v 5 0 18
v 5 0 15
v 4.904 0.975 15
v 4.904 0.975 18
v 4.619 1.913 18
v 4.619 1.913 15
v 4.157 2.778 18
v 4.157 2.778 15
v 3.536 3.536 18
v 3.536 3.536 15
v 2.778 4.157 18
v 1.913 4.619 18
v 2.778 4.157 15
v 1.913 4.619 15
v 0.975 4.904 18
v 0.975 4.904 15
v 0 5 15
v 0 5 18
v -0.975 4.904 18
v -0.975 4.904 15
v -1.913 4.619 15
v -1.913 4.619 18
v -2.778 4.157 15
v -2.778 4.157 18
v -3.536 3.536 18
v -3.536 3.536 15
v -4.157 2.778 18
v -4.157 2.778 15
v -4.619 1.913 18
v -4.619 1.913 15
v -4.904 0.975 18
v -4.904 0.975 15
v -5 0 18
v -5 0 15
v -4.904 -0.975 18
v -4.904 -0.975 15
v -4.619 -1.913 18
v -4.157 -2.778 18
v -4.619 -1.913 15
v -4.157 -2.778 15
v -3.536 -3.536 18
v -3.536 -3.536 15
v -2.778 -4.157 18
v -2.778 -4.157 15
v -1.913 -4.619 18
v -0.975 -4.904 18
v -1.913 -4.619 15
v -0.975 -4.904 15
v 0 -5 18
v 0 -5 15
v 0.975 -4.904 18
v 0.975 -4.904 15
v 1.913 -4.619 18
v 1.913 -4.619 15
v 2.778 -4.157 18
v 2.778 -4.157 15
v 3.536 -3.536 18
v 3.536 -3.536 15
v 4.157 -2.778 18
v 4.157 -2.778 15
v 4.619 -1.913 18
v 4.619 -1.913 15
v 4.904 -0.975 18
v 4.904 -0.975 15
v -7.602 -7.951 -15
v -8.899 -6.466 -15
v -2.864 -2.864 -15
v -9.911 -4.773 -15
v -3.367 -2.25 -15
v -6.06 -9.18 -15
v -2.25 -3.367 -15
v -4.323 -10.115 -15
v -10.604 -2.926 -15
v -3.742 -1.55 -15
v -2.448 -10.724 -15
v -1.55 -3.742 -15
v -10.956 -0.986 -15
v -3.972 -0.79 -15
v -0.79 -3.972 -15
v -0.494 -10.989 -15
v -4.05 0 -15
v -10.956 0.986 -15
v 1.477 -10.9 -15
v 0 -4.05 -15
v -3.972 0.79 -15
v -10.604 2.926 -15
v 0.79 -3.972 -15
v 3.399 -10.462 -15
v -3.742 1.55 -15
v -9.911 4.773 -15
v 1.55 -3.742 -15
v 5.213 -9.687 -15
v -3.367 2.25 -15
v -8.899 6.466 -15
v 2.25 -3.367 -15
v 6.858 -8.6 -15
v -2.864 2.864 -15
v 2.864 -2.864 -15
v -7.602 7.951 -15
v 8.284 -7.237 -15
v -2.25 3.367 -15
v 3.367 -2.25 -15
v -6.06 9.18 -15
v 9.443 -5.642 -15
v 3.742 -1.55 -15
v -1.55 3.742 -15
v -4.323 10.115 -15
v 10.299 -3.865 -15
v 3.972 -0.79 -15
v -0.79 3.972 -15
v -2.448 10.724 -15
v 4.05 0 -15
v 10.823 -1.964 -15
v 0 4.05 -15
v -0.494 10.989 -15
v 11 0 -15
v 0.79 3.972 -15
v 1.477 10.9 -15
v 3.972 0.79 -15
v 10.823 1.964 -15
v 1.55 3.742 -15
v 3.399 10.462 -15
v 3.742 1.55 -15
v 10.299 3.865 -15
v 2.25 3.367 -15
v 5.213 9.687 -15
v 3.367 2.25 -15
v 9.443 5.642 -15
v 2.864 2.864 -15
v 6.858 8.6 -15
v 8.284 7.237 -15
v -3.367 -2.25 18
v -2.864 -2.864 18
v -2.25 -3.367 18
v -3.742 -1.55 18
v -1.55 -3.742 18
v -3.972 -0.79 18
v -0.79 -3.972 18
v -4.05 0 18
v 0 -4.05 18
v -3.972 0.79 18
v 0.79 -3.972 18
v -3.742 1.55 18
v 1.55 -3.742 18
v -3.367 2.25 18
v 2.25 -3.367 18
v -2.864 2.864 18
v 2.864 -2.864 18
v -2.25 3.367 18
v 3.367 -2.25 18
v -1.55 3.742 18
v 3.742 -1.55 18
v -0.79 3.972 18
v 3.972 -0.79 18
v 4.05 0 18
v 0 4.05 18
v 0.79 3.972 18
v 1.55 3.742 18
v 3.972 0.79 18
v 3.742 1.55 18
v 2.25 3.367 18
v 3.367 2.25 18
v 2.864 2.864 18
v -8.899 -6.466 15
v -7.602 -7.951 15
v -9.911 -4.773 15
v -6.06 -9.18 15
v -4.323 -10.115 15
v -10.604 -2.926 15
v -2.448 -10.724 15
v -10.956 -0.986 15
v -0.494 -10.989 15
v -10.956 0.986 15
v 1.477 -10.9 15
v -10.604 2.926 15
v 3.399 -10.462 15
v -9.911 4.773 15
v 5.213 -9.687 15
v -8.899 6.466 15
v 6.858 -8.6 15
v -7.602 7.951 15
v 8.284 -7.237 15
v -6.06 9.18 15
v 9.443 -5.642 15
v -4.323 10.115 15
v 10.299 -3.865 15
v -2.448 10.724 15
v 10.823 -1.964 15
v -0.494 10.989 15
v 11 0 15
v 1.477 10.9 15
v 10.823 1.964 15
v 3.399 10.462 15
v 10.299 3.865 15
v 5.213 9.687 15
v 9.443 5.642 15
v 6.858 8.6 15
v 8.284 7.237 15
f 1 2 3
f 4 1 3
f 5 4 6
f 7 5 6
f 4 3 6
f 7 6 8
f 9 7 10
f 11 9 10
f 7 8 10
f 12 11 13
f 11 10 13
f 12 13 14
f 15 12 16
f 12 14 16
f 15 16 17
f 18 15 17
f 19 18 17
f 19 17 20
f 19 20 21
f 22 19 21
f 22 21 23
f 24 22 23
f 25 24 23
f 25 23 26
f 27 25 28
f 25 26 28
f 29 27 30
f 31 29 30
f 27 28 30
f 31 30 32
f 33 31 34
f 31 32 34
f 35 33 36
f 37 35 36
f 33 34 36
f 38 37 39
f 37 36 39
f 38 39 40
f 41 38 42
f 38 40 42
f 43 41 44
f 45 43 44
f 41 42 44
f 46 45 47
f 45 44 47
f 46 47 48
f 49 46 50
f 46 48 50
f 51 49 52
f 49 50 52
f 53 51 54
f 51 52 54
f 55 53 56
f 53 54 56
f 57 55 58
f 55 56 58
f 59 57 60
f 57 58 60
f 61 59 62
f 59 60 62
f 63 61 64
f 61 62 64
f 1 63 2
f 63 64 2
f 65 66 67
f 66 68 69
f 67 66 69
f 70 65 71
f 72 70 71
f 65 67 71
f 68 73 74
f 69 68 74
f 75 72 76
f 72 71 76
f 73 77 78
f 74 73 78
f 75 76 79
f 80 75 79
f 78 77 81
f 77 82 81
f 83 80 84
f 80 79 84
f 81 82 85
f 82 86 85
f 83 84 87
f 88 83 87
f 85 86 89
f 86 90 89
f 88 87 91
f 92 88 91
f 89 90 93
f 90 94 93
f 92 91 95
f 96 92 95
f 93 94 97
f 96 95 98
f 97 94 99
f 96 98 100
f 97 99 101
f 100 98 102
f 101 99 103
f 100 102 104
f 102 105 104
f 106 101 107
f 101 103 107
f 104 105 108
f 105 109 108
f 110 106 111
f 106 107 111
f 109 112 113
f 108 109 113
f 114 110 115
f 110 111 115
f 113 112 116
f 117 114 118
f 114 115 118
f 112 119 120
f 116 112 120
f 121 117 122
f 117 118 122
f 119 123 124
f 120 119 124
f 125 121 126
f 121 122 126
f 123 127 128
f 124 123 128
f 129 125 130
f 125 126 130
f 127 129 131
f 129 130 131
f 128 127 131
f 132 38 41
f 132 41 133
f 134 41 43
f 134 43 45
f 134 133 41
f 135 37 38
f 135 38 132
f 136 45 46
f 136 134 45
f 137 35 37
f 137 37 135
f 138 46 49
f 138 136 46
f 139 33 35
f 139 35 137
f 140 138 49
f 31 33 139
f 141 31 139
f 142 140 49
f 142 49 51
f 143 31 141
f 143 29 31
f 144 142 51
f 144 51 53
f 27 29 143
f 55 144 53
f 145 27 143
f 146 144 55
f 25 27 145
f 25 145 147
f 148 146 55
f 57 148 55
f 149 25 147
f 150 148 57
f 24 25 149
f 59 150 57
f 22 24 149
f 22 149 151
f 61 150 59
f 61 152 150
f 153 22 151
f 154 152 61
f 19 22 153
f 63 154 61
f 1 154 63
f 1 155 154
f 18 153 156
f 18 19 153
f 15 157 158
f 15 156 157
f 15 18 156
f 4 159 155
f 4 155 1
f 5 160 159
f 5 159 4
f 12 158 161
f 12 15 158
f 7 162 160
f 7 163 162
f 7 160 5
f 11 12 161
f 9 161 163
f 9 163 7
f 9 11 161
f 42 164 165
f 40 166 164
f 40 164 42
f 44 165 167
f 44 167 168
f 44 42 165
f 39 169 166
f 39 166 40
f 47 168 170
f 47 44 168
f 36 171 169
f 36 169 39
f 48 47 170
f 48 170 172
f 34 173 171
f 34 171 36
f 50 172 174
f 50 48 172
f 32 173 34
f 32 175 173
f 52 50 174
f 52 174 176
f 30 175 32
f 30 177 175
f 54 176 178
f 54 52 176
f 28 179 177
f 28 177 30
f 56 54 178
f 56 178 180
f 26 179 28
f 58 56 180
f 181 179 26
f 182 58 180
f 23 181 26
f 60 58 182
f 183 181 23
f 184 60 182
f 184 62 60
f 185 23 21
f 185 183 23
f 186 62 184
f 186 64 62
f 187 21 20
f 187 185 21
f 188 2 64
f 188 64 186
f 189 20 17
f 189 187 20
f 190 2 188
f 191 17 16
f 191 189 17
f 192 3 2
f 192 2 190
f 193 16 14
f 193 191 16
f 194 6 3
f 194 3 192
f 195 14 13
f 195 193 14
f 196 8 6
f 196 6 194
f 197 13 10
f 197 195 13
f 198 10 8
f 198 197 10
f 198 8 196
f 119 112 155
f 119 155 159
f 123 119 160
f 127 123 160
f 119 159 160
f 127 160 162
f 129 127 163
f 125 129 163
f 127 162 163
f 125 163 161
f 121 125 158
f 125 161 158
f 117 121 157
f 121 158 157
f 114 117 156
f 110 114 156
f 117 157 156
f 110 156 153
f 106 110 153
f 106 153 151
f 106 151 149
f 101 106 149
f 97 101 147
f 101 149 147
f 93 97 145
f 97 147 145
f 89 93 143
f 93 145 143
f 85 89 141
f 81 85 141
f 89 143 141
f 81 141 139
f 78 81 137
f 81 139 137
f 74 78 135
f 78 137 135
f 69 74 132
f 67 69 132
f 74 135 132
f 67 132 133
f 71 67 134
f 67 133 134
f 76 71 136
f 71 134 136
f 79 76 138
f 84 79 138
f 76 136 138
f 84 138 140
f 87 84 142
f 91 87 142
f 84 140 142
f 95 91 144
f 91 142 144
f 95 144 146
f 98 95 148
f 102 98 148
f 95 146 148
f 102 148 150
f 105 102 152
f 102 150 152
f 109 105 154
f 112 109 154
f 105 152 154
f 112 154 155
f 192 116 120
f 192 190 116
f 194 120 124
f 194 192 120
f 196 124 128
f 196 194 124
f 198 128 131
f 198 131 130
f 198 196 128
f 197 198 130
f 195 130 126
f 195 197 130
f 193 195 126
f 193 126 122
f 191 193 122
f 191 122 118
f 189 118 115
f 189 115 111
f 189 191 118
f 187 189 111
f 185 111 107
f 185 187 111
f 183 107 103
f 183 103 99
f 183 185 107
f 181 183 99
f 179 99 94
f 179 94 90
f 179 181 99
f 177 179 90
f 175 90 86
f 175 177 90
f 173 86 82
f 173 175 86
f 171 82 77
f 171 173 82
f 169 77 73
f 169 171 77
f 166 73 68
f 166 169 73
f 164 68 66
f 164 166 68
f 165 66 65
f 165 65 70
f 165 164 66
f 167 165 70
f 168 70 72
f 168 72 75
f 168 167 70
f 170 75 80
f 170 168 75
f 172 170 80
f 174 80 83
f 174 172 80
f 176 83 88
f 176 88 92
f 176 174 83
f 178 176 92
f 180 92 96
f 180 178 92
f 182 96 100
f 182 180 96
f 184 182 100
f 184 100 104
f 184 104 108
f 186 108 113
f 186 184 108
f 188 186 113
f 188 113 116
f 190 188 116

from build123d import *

# Parameters (mm, degrees)
CROQUIS1_R              = 11
SALIENTE_EXTRUIR1_DEPTH = 15
CROQUIS3_R              = 5
SALIENTE_EXTRUIR2_DEPTH = 3
CROQUIS2_R              = 4.05
CORTAR_EXTRUIR1_DEPTH   = 289


with BuildPart() as part:
    # Croquis1 → Saliente-Extruir1 (new, symmetric)
    with BuildSketch(Plane.XY):
        Circle(CROQUIS1_R)
    extrude(amount=SALIENTE_EXTRUIR1_DEPTH, both=True)

    # Croquis3 → Saliente-Extruir2 (add)
    with BuildSketch(Plane.XY.offset(15)):
        Circle(CROQUIS3_R)
    extrude(amount=SALIENTE_EXTRUIR2_DEPTH)

    # Croquis2 → Cortar-Extruir1 (cut, symmetric)
    with BuildSketch(Plane.XY.offset(15)):
        Circle(CROQUIS2_R)
    extrude(amount=CORTAR_EXTRUIR1_DEPTH, both=True, mode=Mode.SUBTRACT)


solid = part.part
